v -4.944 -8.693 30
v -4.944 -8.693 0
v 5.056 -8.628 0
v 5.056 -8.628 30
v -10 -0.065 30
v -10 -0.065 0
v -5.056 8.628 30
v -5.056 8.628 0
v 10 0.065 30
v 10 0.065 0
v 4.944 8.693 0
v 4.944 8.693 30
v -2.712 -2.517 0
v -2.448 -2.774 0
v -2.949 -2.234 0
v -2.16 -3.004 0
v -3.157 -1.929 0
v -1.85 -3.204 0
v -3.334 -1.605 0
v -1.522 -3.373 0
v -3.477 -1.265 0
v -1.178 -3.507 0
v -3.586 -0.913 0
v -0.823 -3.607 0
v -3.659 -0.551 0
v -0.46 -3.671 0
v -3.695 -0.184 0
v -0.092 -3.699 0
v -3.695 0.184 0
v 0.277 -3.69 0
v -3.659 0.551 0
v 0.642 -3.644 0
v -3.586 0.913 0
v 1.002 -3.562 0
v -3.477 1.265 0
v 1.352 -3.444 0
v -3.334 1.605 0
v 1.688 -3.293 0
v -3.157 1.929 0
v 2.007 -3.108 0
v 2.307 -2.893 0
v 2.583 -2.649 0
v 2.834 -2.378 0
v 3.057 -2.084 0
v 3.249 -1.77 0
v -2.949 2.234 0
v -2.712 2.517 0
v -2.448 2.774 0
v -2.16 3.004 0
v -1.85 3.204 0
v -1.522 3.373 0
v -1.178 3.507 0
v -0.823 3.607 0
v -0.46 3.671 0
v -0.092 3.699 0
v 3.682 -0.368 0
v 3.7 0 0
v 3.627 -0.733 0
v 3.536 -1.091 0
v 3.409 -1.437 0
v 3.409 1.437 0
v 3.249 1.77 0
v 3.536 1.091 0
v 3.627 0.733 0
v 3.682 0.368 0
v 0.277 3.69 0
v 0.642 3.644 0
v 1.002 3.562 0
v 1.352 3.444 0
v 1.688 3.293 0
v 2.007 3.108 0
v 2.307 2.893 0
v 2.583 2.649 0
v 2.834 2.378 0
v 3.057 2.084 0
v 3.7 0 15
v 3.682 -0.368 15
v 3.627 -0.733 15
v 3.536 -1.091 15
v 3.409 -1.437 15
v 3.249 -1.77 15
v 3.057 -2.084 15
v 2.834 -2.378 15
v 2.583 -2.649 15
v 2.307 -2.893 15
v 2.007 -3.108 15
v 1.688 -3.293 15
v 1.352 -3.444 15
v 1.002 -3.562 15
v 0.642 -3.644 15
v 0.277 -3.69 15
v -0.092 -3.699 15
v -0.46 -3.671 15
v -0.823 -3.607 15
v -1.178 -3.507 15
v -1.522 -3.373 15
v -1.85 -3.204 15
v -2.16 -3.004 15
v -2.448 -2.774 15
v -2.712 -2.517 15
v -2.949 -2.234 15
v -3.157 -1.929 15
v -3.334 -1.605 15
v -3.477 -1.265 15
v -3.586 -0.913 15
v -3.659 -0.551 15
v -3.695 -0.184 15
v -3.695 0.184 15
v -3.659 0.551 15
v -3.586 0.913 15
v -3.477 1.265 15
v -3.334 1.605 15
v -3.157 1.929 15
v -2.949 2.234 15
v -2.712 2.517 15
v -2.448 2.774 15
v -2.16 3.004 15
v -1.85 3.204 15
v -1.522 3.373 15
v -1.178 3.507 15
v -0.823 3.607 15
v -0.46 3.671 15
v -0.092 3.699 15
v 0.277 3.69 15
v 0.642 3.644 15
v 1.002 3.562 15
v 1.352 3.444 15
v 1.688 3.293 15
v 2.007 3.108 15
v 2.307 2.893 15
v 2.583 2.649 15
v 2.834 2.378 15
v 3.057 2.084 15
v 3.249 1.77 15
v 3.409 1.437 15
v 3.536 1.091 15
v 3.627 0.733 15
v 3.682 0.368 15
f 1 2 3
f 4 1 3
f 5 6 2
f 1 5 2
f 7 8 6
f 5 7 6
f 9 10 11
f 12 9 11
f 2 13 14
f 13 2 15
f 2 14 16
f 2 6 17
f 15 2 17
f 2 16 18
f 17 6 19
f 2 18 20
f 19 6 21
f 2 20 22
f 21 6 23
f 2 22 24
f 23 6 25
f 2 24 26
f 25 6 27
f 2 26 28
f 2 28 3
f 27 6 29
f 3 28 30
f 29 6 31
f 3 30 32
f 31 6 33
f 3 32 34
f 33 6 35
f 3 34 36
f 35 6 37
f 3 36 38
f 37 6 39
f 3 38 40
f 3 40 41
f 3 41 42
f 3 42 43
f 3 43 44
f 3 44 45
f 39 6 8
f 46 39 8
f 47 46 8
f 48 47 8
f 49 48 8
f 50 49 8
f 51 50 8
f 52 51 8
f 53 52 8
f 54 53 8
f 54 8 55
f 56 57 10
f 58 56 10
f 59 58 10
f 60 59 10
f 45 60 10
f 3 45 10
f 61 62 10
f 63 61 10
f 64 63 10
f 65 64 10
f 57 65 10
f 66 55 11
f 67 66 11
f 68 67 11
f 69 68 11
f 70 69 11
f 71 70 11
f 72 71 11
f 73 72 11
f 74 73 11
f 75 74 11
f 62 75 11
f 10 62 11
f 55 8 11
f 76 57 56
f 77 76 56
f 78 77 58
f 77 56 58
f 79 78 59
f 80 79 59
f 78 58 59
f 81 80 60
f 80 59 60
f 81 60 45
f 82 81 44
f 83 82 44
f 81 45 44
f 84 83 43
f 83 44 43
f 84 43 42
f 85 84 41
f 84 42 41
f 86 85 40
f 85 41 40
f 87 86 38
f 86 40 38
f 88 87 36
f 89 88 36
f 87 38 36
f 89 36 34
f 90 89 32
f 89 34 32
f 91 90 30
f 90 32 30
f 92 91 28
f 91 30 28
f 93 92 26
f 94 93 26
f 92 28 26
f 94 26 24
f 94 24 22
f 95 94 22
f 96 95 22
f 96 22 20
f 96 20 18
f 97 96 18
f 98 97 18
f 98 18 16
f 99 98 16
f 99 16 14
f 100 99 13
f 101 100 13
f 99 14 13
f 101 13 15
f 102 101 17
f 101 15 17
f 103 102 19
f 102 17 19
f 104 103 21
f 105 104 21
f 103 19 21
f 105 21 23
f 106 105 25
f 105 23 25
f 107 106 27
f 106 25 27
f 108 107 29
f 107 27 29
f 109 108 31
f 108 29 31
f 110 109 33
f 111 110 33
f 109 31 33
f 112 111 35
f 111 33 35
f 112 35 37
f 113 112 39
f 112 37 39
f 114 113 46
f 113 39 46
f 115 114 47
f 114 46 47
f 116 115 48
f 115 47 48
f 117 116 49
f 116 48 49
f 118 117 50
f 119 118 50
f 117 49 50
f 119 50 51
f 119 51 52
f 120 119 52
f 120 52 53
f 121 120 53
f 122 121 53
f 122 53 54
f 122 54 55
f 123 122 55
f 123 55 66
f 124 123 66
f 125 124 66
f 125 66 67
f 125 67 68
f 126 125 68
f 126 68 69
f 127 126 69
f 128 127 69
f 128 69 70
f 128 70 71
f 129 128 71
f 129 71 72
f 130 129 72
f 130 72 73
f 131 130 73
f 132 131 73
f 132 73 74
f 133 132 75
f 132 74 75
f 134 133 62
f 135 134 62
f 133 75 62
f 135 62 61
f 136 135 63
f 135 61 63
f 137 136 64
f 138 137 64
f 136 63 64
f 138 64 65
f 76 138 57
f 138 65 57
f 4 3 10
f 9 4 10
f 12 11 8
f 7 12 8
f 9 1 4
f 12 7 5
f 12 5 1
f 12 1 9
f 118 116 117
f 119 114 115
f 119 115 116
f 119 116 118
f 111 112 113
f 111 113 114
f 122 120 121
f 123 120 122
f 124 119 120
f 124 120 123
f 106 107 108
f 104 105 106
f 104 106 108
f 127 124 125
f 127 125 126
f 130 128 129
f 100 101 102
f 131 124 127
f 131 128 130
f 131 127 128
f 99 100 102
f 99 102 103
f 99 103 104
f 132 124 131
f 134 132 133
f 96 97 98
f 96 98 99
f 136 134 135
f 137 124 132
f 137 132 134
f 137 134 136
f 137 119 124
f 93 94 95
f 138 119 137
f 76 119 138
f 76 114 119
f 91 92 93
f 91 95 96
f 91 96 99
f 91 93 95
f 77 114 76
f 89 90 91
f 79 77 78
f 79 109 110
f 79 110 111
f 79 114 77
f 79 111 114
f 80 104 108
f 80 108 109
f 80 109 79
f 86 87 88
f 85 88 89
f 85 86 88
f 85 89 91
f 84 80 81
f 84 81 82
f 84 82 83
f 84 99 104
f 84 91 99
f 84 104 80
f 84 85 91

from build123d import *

# Parameters (mm, degrees)
F1_DEPTH = 30
F2_R     = 3.7
F3_DEPTH = 15


with BuildPart() as f1:
    # F0 (on Top) → F1 (new body)
    with BuildSketch(Plane.XY):
        Polygon((4.943737, 8.692737), (-5.056263, 8.627771), (-10, -0.064966), (-4.943737, -8.692737), (5.056263, -8.627771), (10, 0.064966), align=None)
    extrude(amount=F1_DEPTH)

    # F2 (on face) → F3 (cut)
    with BuildSketch(Plane(origin=(0, 0, 0), x_dir=(1, 0, 0), z_dir=(0, 0, -1))):
        Circle(F2_R)
    extrude(amount=-F3_DEPTH, mode=Mode.SUBTRACT)


solid = f1.part
